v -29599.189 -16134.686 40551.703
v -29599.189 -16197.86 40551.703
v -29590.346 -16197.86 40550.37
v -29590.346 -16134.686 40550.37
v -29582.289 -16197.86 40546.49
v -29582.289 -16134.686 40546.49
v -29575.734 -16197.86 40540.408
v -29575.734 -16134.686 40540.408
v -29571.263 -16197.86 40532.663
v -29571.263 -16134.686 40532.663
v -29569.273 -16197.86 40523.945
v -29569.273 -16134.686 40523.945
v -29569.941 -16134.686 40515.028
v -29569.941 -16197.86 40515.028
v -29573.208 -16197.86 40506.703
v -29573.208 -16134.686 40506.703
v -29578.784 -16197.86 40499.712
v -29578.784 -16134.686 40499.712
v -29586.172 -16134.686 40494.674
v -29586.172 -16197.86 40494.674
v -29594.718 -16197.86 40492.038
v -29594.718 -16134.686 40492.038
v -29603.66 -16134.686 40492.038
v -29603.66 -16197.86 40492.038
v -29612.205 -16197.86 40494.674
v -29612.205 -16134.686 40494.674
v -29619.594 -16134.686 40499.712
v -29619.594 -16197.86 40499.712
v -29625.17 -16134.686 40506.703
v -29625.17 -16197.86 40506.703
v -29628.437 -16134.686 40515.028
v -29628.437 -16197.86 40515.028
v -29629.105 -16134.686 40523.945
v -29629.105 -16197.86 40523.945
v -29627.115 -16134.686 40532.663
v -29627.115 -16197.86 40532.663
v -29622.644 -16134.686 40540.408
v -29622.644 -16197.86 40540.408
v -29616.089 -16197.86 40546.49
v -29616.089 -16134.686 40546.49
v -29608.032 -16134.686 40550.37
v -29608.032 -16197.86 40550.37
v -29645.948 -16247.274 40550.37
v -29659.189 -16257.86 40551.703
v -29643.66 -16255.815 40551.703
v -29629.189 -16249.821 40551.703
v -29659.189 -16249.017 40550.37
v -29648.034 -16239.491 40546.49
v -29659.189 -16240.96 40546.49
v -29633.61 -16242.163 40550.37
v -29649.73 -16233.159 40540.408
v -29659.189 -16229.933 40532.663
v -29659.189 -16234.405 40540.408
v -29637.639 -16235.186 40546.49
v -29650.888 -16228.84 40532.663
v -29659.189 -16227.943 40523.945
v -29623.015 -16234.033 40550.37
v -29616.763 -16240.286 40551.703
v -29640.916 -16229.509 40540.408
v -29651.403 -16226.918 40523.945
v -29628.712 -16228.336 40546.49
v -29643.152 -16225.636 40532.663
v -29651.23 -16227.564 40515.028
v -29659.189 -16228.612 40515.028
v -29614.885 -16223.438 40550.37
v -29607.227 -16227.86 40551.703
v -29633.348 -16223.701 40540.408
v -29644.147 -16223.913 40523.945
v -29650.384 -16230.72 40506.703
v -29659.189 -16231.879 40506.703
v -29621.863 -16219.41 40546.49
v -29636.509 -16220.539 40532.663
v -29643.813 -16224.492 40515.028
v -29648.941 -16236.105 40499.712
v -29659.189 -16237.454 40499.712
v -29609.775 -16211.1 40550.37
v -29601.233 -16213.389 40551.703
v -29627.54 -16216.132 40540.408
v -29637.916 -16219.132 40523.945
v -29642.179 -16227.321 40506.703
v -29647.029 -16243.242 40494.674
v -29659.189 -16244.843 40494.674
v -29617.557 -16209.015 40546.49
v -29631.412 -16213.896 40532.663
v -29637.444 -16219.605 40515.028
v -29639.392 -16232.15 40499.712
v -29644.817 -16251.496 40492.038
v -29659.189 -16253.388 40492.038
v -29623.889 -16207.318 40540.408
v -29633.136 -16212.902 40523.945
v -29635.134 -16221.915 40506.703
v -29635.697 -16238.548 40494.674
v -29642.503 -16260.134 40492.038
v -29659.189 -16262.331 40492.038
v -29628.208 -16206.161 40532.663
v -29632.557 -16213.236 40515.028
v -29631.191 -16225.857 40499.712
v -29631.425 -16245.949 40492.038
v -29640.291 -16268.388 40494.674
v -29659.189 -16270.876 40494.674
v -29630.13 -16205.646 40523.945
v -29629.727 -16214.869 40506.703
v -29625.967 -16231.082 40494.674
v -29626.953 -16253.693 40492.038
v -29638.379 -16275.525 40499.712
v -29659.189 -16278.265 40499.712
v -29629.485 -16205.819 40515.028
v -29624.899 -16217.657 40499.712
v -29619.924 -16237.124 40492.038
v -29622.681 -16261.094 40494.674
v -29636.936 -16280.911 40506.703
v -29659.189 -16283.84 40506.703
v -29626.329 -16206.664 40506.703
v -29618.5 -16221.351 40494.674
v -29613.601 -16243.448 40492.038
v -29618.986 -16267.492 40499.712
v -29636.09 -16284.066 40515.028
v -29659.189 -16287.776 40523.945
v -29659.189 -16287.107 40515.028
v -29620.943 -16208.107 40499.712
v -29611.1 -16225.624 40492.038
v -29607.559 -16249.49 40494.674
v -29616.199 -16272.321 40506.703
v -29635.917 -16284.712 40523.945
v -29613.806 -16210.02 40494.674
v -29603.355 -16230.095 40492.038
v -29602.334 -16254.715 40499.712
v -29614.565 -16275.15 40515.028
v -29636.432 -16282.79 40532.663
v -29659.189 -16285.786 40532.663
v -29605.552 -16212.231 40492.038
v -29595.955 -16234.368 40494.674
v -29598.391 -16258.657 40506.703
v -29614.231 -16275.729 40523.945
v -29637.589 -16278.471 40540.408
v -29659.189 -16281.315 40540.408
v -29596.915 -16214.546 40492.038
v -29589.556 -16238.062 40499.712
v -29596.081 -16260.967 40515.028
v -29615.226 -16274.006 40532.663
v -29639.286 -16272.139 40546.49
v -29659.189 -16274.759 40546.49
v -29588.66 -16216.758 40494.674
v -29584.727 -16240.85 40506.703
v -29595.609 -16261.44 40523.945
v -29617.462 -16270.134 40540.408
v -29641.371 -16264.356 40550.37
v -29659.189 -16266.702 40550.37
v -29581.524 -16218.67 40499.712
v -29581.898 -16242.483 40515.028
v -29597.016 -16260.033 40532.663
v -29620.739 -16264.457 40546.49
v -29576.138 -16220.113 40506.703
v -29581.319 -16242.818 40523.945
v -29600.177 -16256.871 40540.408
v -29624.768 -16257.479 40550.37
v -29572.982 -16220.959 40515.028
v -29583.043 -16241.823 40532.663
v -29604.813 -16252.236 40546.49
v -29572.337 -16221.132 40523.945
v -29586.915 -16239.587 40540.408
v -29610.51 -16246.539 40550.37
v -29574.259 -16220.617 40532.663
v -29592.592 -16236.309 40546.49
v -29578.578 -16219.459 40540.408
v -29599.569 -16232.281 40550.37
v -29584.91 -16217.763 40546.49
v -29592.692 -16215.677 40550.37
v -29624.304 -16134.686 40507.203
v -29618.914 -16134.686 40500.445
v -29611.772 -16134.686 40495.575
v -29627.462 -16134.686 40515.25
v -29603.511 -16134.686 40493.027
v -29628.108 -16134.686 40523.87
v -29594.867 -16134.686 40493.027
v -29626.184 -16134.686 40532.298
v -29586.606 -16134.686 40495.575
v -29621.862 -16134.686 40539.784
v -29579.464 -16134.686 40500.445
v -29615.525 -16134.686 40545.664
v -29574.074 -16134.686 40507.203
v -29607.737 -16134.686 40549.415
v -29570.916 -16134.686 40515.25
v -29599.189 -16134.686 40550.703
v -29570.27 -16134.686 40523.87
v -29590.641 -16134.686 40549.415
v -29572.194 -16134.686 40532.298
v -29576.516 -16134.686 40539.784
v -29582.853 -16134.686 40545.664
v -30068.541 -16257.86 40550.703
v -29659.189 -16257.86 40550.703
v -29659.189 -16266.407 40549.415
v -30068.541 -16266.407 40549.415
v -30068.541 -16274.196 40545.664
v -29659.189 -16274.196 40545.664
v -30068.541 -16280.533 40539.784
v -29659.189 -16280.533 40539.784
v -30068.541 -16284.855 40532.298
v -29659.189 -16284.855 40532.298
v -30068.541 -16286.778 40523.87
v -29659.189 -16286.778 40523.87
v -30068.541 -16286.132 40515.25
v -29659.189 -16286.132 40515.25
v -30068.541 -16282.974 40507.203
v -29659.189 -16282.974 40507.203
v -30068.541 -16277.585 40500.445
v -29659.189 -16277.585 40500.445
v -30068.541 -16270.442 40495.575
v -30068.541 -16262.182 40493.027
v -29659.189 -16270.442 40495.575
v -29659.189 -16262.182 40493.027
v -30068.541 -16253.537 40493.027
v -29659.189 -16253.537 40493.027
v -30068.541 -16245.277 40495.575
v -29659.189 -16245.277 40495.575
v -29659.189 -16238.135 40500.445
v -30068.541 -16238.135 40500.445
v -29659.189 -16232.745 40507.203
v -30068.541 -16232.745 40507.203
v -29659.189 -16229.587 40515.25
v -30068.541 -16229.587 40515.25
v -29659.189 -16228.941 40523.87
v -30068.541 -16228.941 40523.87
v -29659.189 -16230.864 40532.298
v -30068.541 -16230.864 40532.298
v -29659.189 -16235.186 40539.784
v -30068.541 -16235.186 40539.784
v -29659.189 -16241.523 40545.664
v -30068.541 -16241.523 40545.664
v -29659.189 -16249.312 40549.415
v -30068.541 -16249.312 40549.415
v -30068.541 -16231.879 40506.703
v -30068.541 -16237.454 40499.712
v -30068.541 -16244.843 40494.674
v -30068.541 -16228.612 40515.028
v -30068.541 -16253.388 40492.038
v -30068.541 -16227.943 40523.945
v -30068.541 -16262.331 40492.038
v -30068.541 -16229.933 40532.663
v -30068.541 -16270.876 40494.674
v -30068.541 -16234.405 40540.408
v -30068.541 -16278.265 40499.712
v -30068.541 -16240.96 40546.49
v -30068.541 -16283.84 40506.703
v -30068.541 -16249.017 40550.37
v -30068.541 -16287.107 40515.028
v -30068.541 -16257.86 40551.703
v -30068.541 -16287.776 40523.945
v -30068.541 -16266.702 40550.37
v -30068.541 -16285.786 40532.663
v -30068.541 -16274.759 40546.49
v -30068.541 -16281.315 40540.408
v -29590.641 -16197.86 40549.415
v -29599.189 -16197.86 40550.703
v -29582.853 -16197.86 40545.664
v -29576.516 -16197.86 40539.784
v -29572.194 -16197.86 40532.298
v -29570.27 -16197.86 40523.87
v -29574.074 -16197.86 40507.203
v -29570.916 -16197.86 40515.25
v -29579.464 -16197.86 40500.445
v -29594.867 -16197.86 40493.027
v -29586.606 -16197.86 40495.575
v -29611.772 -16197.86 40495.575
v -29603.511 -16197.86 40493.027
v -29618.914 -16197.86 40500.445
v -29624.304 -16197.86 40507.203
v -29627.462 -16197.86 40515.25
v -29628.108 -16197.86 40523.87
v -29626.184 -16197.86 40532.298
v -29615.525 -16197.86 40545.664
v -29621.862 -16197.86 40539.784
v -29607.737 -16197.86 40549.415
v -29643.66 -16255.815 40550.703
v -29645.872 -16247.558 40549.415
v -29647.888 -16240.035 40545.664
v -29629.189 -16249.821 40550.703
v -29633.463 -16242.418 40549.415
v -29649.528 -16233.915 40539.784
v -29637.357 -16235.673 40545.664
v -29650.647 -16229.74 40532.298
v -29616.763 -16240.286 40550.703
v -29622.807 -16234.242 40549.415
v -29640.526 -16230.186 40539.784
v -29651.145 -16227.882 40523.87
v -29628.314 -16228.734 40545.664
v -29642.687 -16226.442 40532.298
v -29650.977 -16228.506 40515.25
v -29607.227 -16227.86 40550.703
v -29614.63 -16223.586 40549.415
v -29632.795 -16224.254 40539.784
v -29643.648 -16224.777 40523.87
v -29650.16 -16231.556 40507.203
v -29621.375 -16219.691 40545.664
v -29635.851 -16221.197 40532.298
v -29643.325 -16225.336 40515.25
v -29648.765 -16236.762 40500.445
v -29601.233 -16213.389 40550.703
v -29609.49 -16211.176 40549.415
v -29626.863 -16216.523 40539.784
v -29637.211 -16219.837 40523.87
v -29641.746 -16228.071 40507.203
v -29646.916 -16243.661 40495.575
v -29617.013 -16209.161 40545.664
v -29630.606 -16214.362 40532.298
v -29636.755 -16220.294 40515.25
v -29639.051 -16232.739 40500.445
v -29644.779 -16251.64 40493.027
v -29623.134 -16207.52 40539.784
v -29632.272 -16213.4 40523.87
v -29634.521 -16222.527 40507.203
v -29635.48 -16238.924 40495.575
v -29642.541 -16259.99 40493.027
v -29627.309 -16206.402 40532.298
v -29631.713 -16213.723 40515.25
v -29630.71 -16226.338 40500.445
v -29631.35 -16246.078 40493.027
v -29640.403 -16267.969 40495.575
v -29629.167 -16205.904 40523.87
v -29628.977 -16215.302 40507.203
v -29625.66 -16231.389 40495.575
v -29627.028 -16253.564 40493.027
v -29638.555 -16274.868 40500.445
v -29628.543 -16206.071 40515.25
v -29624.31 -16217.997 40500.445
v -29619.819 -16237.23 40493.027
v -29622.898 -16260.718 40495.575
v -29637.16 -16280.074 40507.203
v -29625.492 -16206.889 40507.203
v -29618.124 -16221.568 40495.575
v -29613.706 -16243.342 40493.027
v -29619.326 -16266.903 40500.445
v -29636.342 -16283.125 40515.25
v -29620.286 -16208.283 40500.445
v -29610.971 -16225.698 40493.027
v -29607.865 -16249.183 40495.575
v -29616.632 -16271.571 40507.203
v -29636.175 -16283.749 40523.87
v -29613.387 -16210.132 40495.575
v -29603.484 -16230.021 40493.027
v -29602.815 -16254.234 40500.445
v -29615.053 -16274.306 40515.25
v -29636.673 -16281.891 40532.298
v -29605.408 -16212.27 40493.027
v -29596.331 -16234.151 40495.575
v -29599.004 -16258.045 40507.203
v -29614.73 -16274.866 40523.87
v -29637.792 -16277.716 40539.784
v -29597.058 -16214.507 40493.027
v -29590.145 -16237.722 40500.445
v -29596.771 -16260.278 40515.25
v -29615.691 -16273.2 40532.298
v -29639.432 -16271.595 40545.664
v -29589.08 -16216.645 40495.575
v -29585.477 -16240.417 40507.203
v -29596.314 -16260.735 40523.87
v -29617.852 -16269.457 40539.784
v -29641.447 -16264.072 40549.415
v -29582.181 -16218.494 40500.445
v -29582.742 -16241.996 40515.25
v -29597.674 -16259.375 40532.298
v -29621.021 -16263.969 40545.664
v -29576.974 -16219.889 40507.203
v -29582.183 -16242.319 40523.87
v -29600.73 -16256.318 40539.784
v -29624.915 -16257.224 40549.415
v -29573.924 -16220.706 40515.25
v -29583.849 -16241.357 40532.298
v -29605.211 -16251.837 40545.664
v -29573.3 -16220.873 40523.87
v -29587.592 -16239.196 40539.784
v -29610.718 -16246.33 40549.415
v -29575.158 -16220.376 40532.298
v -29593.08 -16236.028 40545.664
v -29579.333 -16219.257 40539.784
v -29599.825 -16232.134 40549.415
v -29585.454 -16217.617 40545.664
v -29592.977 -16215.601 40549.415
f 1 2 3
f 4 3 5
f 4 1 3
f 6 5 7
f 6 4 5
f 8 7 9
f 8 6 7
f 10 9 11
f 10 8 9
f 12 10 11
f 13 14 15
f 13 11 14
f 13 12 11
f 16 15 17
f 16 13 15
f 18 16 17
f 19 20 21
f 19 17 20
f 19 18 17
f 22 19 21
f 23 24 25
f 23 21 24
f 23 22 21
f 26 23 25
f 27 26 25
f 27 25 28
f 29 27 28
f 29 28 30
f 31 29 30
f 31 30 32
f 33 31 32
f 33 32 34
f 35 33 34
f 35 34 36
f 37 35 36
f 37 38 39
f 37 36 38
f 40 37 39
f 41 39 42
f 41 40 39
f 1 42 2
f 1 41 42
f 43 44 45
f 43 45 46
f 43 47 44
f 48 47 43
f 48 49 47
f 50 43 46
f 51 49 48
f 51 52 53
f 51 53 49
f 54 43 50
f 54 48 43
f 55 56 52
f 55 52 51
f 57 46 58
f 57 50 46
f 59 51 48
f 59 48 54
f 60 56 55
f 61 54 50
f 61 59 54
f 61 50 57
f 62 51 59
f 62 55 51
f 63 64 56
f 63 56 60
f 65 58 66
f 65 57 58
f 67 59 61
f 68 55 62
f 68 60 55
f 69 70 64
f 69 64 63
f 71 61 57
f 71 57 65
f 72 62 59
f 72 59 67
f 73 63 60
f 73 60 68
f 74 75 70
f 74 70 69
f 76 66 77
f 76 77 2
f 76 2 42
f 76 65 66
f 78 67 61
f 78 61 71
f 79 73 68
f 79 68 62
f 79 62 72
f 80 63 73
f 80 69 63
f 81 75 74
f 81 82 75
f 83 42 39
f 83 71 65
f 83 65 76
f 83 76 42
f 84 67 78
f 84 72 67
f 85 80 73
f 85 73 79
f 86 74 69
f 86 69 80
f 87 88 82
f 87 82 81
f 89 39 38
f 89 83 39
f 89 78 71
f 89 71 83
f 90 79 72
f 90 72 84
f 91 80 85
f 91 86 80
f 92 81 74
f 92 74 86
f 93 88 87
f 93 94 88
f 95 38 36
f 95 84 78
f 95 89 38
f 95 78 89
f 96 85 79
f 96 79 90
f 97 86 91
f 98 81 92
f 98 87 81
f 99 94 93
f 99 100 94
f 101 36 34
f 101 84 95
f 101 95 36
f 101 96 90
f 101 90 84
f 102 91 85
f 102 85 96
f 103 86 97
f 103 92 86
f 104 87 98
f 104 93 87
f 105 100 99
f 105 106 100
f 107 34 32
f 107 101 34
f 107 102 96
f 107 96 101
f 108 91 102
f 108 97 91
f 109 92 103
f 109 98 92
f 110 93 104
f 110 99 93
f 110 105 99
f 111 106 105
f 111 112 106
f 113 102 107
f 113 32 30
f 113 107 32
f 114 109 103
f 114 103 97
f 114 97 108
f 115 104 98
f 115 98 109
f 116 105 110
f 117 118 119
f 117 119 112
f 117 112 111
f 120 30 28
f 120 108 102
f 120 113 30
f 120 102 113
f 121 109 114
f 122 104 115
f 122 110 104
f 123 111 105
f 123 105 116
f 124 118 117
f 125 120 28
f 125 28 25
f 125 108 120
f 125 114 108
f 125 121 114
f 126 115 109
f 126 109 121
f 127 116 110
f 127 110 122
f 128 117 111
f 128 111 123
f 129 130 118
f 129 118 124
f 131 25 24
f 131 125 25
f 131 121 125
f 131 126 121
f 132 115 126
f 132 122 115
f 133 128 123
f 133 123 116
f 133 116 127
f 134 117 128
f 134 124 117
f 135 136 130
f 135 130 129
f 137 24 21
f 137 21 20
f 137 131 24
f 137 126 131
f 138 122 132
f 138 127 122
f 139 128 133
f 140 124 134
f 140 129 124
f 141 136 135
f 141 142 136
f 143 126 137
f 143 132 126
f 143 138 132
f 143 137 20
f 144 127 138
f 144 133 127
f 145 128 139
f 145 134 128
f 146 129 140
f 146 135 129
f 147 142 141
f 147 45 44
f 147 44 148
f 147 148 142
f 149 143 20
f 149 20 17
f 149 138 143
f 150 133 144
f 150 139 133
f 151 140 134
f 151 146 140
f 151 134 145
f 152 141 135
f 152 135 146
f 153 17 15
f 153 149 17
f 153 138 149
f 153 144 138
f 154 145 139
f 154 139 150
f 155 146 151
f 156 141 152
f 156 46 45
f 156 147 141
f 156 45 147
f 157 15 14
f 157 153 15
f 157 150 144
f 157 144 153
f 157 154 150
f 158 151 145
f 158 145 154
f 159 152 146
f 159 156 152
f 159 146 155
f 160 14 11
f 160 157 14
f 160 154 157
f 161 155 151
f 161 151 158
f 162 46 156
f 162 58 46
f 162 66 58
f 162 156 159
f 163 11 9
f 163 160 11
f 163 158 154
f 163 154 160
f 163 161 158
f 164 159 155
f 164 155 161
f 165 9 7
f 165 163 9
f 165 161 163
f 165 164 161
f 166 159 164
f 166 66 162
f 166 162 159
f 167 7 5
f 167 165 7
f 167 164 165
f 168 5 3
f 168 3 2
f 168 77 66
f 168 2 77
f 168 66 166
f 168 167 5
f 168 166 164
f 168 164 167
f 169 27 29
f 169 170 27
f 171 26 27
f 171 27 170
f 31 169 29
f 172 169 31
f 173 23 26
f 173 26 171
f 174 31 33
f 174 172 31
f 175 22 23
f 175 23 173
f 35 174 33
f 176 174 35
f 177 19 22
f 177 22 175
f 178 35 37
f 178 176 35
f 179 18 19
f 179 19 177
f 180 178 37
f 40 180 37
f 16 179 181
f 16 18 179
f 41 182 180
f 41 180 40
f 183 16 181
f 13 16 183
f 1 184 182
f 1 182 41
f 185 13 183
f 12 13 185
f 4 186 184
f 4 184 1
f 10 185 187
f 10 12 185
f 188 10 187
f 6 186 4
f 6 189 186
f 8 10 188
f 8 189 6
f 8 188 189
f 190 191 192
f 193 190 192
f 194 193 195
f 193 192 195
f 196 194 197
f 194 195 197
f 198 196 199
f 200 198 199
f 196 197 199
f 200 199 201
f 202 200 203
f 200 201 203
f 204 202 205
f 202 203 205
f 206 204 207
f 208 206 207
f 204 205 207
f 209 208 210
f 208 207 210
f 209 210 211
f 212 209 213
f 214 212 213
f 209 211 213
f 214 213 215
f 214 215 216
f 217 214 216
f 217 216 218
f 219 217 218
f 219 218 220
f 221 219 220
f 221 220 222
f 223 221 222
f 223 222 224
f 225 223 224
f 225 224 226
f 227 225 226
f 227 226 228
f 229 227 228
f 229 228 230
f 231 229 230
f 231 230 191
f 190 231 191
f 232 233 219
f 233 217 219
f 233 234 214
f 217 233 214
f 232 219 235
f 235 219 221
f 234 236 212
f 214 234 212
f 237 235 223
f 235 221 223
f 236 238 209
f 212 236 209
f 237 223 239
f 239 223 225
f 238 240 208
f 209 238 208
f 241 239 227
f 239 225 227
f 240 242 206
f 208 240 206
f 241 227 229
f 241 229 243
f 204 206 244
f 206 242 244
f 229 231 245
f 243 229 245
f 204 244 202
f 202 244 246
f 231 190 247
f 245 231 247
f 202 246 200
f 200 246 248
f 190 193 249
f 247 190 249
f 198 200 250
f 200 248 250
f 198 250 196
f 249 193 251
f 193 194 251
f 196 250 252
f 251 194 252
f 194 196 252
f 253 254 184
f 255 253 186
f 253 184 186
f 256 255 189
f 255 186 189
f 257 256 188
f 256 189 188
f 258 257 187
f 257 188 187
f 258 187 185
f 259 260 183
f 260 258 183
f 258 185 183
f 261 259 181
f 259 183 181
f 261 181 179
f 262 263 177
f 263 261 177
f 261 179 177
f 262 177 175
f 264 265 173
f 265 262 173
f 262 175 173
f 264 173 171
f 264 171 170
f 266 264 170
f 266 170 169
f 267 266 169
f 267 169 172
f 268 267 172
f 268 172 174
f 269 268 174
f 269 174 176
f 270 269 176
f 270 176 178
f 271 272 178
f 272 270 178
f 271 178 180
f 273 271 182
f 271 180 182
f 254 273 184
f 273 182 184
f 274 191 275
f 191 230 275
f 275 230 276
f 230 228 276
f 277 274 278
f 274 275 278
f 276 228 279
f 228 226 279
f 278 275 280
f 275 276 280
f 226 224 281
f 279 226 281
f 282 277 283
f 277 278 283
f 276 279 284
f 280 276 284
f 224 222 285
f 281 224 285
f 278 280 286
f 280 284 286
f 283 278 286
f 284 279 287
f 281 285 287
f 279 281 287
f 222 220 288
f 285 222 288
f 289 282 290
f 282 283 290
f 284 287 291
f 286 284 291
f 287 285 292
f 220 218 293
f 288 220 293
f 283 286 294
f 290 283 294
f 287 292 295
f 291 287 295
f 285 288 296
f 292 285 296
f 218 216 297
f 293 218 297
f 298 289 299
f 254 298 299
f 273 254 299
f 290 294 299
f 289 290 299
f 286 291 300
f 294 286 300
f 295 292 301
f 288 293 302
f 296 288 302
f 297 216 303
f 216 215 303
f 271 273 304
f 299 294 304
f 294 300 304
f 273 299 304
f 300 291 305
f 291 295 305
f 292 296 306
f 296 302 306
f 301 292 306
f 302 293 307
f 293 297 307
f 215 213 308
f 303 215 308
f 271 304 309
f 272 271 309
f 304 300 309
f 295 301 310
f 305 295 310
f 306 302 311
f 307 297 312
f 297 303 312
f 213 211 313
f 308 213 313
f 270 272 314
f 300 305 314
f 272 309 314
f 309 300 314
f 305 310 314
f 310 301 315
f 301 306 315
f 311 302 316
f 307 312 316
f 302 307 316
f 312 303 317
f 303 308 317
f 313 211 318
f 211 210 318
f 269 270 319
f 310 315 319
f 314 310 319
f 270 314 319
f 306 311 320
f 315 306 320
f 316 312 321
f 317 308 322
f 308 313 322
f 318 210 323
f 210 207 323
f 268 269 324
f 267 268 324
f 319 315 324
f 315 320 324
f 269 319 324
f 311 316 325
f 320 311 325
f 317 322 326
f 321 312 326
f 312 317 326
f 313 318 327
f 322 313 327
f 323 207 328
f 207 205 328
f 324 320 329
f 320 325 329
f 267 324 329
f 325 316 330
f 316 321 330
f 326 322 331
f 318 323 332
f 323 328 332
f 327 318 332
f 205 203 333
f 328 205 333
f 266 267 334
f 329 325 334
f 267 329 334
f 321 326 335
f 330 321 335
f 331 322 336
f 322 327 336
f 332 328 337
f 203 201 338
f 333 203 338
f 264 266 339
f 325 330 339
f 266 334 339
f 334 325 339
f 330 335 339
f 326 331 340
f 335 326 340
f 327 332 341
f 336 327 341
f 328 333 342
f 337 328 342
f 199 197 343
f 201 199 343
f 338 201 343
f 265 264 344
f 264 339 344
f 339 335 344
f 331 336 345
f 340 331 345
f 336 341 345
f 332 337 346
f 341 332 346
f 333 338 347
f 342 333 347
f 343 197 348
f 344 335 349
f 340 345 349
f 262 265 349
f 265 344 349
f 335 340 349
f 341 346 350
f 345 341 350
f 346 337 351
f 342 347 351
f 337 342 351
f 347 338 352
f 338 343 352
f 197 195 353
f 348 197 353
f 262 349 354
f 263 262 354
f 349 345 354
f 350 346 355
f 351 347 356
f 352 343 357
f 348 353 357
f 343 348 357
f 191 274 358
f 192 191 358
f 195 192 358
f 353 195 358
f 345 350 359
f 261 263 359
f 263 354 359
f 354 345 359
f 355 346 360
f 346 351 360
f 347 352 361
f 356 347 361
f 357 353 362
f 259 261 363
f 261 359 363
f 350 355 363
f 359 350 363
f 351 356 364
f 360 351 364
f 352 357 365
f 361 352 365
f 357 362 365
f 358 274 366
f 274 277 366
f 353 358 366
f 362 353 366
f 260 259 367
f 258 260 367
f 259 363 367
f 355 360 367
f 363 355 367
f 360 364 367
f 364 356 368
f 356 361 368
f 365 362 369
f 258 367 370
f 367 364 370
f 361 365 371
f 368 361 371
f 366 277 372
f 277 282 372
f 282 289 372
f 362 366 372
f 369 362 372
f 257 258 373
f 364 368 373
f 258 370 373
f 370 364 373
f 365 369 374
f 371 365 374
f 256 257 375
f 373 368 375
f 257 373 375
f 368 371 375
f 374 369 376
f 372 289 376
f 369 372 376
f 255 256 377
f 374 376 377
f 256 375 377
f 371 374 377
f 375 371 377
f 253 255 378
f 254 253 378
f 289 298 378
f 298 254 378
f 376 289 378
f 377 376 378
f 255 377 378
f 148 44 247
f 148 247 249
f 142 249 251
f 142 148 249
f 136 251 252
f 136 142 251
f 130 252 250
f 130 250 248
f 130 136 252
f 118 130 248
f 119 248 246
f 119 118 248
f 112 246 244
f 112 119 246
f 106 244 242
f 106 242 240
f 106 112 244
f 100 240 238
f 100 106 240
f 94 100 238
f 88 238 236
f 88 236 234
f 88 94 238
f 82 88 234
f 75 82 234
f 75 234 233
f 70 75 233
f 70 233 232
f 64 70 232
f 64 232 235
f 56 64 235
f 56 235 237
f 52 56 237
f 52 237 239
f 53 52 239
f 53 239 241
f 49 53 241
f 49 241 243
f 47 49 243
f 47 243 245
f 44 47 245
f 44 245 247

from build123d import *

# Parameters (mm, degrees)
SWEEP_THIN1_PROFILE_R   = 30
SWEEP_THIN1_PROFILE_R_2 = 29


with BuildPart() as part:
    # Sweep-Thin1: sweep along a curve in space
    with BuildLine() as sweep_thin1_path:
        Line((-30068.540907505, -16257.859563295, 40521.703196056), (-29659.188972505, -16257.859563295, 40521.703196056))
        ThreePointArc((-29599.188972505, -16197.859563295, 40521.703196056), (-29616.762565634, -16240.285970167, 40521.703196056), (-29659.188972505, -16257.859563295, 40521.703196056))
        Line((-29599.188972505, -16197.859563295, 40521.703196056), (-29599.188972505, -16134.686242211, 40521.703196056))
    # Sweep-Thin1 profile (on start of the path) → Sweep-Thin1 (sweep)
    with BuildSketch(Plane(origin=(-30068.540907505, -16257.859563295, 40521.703196056), x_dir=(0, 0, 1), z_dir=(1, 0, 0))):
        Circle(SWEEP_THIN1_PROFILE_R)
        Circle(SWEEP_THIN1_PROFILE_R_2, mode=Mode.SUBTRACT)
    sweep(path=sweep_thin1_path.line)


solid = part.part
